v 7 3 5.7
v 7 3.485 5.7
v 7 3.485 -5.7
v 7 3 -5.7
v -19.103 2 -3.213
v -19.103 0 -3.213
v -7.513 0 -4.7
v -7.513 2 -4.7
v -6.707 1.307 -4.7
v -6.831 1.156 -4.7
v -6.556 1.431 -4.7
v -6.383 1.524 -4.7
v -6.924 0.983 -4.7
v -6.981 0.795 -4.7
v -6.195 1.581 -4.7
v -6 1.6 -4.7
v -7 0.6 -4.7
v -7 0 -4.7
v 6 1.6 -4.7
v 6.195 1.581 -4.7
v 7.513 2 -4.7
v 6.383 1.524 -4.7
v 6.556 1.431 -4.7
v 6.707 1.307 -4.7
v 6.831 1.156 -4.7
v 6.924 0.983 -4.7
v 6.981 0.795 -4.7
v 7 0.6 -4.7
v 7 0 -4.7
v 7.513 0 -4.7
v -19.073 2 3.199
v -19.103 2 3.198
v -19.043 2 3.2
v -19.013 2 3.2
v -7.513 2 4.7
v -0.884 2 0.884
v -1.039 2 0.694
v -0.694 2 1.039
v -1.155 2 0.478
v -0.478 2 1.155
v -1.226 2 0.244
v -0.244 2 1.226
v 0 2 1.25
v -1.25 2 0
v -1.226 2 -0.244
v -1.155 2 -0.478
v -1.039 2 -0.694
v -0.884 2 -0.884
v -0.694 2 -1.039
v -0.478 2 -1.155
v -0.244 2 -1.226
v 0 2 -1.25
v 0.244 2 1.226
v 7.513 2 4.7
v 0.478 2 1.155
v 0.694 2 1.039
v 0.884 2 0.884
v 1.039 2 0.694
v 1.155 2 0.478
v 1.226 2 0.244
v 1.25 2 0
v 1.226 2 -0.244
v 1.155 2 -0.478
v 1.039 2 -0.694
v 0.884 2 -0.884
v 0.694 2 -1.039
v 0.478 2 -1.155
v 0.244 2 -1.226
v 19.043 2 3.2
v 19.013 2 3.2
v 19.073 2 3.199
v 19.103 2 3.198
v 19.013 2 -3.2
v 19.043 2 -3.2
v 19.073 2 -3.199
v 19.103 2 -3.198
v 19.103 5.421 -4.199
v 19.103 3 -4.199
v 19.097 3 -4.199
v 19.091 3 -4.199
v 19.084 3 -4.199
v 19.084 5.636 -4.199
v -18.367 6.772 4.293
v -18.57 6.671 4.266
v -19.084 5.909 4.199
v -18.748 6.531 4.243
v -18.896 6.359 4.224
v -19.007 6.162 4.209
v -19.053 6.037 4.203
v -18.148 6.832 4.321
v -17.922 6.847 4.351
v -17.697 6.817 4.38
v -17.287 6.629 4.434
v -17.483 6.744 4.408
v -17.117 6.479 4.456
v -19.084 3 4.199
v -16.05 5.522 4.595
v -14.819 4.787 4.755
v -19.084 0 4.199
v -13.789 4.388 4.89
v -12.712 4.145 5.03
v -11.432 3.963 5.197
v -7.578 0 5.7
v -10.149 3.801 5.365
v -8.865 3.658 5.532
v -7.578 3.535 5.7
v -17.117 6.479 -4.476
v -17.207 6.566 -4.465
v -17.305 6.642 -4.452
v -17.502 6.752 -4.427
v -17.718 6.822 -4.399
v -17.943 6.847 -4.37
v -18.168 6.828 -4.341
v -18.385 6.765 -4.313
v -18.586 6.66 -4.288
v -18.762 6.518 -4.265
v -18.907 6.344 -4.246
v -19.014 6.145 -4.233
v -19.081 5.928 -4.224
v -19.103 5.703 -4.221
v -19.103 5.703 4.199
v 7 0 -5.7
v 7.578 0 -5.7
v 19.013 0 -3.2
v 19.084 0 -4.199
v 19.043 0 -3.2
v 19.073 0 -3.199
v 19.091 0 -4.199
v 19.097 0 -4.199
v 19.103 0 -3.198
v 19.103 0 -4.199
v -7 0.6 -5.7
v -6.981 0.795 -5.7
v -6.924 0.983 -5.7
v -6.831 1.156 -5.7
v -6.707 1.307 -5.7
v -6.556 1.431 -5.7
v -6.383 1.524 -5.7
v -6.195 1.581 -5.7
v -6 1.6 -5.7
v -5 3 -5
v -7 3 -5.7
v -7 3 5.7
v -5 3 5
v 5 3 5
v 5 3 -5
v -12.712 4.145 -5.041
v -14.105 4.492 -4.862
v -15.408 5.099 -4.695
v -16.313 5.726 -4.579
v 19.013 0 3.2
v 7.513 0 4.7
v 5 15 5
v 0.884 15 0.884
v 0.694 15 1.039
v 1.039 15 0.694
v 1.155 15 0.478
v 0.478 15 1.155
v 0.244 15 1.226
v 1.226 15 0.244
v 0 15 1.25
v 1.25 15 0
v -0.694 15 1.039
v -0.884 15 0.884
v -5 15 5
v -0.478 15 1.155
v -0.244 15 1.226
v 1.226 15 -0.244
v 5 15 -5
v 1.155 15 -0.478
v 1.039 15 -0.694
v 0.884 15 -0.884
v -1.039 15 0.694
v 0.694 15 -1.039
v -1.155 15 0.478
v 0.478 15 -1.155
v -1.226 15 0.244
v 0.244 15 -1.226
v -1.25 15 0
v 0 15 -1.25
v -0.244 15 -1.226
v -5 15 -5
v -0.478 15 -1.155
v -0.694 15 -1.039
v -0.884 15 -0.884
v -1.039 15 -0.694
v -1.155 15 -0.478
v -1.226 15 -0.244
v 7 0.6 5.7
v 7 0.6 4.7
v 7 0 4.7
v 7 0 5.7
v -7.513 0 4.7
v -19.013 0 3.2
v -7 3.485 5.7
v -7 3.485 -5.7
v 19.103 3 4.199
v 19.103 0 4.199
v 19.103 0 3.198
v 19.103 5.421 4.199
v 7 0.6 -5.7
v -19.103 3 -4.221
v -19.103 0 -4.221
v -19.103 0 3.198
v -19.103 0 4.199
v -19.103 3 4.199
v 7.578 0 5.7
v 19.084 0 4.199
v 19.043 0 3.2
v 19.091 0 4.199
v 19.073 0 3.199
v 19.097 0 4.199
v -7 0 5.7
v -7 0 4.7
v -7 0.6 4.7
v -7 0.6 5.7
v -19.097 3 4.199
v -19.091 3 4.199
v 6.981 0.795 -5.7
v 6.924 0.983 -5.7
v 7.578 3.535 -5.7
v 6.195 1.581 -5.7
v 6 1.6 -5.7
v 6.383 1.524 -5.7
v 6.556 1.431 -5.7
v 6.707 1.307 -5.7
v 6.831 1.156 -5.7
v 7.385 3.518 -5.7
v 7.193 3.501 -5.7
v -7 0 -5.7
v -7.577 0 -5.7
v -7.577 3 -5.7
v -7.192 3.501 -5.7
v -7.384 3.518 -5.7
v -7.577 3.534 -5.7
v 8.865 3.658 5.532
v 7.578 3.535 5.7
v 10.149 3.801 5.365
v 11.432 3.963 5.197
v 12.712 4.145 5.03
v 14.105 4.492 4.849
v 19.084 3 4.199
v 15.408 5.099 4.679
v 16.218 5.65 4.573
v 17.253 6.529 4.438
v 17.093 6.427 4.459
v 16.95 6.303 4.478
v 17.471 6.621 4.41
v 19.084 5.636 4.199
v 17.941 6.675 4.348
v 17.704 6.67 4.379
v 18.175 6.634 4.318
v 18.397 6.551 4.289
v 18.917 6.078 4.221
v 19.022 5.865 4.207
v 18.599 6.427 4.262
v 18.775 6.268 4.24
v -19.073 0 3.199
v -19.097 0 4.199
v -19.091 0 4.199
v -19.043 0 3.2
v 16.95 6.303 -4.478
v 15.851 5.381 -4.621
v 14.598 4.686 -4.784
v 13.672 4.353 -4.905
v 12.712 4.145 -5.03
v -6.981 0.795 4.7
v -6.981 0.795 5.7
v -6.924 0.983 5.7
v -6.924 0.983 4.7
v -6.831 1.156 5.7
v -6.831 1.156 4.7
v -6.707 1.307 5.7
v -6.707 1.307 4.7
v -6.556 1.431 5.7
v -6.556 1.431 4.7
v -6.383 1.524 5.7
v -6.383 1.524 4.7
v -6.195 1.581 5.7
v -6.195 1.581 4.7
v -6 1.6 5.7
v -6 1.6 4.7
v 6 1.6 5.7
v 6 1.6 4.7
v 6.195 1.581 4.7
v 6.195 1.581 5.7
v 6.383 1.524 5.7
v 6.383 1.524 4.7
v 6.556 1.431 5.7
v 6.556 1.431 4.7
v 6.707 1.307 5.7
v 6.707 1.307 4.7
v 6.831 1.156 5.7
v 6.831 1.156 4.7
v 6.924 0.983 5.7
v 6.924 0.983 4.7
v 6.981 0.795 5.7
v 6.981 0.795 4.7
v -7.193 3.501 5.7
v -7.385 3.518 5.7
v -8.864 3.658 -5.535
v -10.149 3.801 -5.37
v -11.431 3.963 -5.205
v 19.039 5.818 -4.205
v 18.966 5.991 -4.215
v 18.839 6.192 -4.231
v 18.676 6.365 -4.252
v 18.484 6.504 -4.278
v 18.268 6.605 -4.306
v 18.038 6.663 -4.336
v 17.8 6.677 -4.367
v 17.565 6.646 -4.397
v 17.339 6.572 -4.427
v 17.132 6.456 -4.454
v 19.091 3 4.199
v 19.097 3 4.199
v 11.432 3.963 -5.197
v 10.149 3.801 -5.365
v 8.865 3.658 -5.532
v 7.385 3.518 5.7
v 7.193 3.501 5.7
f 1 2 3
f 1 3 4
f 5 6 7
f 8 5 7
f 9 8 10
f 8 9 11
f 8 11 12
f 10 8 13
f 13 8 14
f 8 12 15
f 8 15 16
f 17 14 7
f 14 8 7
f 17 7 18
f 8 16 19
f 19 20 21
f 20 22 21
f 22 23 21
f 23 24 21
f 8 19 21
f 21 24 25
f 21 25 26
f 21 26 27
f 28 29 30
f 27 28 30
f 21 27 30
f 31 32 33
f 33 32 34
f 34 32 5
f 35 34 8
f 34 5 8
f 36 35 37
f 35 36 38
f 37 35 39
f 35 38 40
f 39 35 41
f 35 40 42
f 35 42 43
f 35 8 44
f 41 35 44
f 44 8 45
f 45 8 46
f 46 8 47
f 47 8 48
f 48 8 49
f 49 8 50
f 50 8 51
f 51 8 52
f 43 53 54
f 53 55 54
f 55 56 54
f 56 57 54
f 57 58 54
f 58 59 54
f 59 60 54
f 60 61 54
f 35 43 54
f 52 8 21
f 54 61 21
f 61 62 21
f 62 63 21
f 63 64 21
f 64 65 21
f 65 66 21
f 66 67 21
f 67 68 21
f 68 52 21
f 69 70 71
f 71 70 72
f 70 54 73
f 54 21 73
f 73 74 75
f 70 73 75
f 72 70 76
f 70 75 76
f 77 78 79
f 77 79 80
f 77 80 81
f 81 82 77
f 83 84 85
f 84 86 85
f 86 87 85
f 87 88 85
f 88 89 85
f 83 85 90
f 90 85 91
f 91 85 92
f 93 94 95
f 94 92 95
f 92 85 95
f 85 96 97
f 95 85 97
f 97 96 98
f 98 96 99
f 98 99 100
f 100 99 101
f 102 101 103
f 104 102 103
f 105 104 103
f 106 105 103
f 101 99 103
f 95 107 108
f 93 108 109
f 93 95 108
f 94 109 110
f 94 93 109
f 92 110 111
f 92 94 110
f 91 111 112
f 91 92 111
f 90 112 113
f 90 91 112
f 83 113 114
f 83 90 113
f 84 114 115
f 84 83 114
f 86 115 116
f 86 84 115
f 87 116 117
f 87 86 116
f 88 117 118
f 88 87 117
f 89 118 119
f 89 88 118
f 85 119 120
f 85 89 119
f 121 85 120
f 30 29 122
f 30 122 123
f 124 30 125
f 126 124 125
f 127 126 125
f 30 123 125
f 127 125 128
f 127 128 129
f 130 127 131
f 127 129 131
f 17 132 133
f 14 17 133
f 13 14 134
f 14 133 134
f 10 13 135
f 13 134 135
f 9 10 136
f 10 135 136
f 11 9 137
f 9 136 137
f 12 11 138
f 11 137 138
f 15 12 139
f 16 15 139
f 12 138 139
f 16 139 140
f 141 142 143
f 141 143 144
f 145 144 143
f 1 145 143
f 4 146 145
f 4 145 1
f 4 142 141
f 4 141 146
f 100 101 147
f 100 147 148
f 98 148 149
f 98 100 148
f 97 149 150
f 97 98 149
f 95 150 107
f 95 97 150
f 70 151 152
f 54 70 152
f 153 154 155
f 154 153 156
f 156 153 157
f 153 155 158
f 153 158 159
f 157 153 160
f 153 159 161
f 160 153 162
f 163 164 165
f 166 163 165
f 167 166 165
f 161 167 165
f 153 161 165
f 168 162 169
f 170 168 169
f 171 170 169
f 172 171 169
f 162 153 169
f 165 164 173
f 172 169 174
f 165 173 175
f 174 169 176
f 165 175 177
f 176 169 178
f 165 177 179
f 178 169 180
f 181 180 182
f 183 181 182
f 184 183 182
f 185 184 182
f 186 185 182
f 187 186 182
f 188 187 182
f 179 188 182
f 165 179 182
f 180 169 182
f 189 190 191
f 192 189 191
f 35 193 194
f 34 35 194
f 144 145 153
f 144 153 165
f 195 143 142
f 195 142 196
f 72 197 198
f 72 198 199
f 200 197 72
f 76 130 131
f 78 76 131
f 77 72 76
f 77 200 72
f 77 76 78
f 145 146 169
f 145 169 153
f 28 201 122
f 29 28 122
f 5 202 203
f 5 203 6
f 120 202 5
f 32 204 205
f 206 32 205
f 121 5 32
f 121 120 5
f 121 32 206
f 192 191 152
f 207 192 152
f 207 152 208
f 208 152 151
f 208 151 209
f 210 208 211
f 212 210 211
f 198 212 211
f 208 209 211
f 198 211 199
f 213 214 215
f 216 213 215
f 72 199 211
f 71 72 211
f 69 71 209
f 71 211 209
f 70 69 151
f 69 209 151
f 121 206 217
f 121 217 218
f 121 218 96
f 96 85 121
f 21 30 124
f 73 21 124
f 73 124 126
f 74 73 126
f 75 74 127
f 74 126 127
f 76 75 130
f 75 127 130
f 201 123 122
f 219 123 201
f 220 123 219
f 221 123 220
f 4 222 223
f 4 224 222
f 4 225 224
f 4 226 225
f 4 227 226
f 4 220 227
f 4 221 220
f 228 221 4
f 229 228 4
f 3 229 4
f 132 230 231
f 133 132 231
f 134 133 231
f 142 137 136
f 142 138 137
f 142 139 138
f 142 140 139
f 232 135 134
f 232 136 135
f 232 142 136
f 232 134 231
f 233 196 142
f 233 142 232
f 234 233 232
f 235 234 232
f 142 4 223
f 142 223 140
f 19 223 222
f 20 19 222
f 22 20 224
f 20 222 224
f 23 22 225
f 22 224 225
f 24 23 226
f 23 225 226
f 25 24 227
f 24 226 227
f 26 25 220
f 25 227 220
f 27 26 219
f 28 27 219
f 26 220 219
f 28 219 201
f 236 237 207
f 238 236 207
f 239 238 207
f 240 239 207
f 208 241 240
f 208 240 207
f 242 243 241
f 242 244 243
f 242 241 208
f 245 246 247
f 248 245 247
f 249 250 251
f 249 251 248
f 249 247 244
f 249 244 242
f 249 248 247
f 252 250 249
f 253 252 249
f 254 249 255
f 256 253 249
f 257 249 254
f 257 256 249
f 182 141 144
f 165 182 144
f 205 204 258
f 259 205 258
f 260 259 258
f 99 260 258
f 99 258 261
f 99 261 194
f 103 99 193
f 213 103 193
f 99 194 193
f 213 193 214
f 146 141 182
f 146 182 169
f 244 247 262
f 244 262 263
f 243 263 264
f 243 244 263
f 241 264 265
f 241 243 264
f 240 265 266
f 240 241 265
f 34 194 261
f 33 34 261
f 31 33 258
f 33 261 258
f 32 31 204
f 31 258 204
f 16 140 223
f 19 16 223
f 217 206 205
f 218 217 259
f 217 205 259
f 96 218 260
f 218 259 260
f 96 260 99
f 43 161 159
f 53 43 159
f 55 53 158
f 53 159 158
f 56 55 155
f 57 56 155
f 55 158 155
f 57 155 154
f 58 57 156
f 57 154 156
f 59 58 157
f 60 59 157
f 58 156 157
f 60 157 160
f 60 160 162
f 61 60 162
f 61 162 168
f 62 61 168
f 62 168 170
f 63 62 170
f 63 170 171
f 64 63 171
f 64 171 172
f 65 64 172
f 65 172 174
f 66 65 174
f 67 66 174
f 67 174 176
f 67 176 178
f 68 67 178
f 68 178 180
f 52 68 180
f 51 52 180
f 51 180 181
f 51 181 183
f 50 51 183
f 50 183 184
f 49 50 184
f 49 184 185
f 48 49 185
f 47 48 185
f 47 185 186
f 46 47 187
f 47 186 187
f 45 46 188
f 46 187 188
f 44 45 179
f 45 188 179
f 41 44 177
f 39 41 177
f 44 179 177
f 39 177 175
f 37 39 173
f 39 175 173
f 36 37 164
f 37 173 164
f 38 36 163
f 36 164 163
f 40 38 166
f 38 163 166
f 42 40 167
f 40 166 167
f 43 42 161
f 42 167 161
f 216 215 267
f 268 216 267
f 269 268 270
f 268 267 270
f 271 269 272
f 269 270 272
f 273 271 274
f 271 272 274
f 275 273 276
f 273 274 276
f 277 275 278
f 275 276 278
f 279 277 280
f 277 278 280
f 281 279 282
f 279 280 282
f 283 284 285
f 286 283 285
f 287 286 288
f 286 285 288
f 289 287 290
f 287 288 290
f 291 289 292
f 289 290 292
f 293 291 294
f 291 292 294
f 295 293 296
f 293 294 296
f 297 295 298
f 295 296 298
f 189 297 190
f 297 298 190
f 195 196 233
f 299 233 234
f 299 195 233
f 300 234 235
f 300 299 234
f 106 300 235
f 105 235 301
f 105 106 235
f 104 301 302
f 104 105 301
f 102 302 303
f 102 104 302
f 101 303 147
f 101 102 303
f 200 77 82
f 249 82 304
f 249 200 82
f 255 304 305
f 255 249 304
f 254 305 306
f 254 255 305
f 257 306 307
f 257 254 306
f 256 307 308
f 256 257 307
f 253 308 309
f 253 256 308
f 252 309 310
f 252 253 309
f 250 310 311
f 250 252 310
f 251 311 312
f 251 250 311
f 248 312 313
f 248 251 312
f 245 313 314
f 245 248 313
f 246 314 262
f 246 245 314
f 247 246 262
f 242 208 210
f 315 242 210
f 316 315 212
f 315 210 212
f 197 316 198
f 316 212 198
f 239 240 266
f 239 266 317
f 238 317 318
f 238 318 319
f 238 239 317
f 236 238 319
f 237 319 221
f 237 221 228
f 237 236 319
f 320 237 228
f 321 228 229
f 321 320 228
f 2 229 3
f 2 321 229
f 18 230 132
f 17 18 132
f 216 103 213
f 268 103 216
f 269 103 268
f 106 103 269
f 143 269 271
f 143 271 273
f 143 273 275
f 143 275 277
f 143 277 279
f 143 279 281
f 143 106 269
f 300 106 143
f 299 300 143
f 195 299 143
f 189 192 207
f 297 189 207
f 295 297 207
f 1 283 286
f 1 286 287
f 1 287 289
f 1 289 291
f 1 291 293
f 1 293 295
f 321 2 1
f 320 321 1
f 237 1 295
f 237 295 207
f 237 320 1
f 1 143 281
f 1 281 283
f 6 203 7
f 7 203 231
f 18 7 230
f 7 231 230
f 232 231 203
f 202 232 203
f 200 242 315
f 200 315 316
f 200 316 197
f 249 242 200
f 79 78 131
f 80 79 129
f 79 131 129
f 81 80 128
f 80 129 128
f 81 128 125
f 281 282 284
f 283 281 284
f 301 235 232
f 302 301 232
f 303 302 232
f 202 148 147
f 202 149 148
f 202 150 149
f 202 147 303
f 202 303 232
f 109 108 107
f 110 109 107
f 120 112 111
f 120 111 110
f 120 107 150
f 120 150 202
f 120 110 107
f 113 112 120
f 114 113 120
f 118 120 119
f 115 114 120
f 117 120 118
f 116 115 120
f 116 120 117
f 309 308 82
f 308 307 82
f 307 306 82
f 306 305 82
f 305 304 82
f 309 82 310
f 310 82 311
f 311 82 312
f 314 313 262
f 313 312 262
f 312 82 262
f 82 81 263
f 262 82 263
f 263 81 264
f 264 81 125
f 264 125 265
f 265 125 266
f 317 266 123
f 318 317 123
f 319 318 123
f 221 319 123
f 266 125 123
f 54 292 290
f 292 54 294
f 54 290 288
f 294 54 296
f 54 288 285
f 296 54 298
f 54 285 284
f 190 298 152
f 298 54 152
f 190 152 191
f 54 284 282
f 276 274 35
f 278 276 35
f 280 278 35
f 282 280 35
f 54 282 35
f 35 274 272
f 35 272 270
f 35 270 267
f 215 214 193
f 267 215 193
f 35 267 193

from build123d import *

# Parameters (mm, degrees)
BOSS_EXTRUDE1_DEPTH     = 2
BOSS_EXTRUDE2_DEPTH     = 1
BOSS_EXTRUDE3_DEPTH     = 12
BOSS_EXTRUDE4_REACH     = 31.886
CUT_EXTRUDE1_DEPTH      = 27.734434724
CUT_EXTRUDE1_DEPTH_BACK = 27.734434724
SKETCH6_R               = 1.25
CUT_EXTRUDE2_DEPTH      = 25.948268421
CUT_EXTRUDE3_DEPTH      = 27.830693137


with BuildPart() as part:
    # Sketch1 → Boss-Extrude1 (new body)
    with BuildSketch(Plane(origin=(0, 0, 0), x_dir=(1, 0, 0), z_dir=(0, 1, 0))):
        with BuildLine():
            Line((-7.576663768, 5.7), (-19.534464968, 4.165854918))
            ThreePointArc((-19.534464968, 4.165854918), (-23.193935143, -0.225628046), (-19.084438942, -4.199151112))
            Line((-19.084438942, -4.199151112), (-7.577930804, -5.7))
            Line((-7.577930804, -5.7), (7.577930804, -5.7))
            Line((7.577930804, -5.7), (19.084438942, -4.199151112))
            ThreePointArc((19.084438942, -4.199151112), (23.2, 0), (19.084438942, 4.199151112))
            Line((19.084438942, 4.199151112), (7.577930804, 5.7))
            Line((7.577930804, 5.7), (-7.576663768, 5.7))
        make_face()
        with BuildLine():
            Line((-7.512988467, -4.7), (-19.013197102, -3.199972787))
            ThreePointArc((-19.013197102, -3.199972787), (-22.193903464, -0.197435212), (-19.407211404, 3.173984699))
            Line((-19.407211404, 3.173984699), (-7.512777295, 4.7))
            Line((-7.512777295, 4.7), (7.512988467, 4.7))
            Line((7.512988467, 4.7), (19.013197102, 3.199972787))
            ThreePointArc((19.013197102, 3.199972787), (22.2, 0), (19.013197102, -3.199972787))
            Line((19.013197102, -3.199972787), (7.512988467, -4.7))
            Line((7.512988467, -4.7), (-7.512988467, -4.7))
        make_face(mode=Mode.SUBTRACT)
    extrude(amount=BOSS_EXTRUDE1_DEPTH)

    # Sketch2 → Boss-Extrude2 (add)
    with BuildSketch(Plane(origin=(0, 2, 0), x_dir=(1, 0, 0), z_dir=(0, 1, 0))):
        with BuildLine():
            Line((7.577930804, -5.7), (19.084438942, -4.199151112))
            ThreePointArc((19.084438942, -4.199151112), (23.2, 0), (19.084438942, 4.199151112))
            Line((19.084438942, 4.199151112), (7.577930804, 5.7))
            Line((7.577930804, 5.7), (-7.576663768, 5.7))
            Line((-7.576663768, 5.7), (-19.534464968, 4.165854918))
            ThreePointArc((-19.534464968, 4.165854918), (-23.193935143, -0.225628046), (-19.084438942, -4.199151112))
            Line((-19.084438942, -4.199151112), (-7.577930804, -5.7))
            Line((-7.577930804, -5.7), (7.577930804, -5.7))
        make_face()
    extrude(amount=BOSS_EXTRUDE2_DEPTH)

    # Sketch3 → Boss-Extrude3 (add)
    with BuildSketch(Plane(origin=(0, 3, 0), x_dir=(1, 0, 0), z_dir=(0, 1, 0))):
        Polygon((-5, 0), (-5, 5), (5, 5), (5, -5), (-5, -5), align=None)
    extrude(amount=BOSS_EXTRUDE3_DEPTH)

    # Boss-Extrude4: up to this face of the body (flat: up to its plane)
    boss_extrude4_end = Plane(part.part.faces().sort_by_distance((0.000633518, 1.5, -5.7))[0])
    # Sketch4 → Boss-Extrude4 (add, up to the picked face)
    with BuildSketch(Plane.XY.offset(5.7), mode=Mode.PRIVATE) as boss_extrude4_sk1:
        with BuildLine():
            Line((-19.103038774, 3), (-7, 3))
            Line((-7, 3), (-7, 3.485357144))
            ThreePointArc((-7, 3.485357144), (-9.86131573, 3.767251876), (-12.711609357, 4.144635751))
            ThreePointArc((-12.711609357, 4.144635751), (-15.114103805, 4.934855361), (-17.117340124, 6.478704724))
            ThreePointArc((-17.117340124, 6.478704724), (-18.375058248, 6.768970937), (-19.103038774, 5.703065825))
            Line((-19.103038774, 5.703065825), (-19.103038774, 3))
        make_face()
    boss_extrude4_tool1 = split(extrude(boss_extrude4_sk1.sketch, amount=-BOSS_EXTRUDE4_REACH, mode=Mode.PRIVATE), bisect_by=boss_extrude4_end, keep=Keep.BOTH, mode=Mode.PRIVATE)
    # Sketch4 → Boss-Extrude4 (add, up to the picked face)
    with BuildSketch(Plane.XY.offset(5.7), mode=Mode.PRIVATE) as boss_extrude4_sk2:
        with BuildLine():
            Line((7, 3.485357144), (7, 3))
            Line((7, 3), (19.103038774, 3))
            Line((19.103038774, 3), (19.103038774, 5.420959691))
            ThreePointArc((19.103038774, 5.420959691), (18.322193887, 6.584407955), (16.949634957, 6.302605569))
            ThreePointArc((16.949634957, 6.302605569), (15.0061995, 4.878805237), (12.711609357, 4.144635751))
            ThreePointArc((12.711609357, 4.144635751), (9.86131573, 3.767251876), (7, 3.485357144))
        make_face()
    boss_extrude4_tool2 = split(extrude(boss_extrude4_sk2.sketch, amount=-BOSS_EXTRUDE4_REACH, mode=Mode.PRIVATE), bisect_by=boss_extrude4_end, keep=Keep.BOTH, mode=Mode.PRIVATE)
    add(boss_extrude4_tool1.solids().sort_by(Axis((-15.203187, 4.213829, 5.7), (0, 0, -1)))[0])
    add(boss_extrude4_tool2.solids().sort_by(Axis((15.148816, 4.17304, 5.7), (0, 0, -1)))[0])

    # Sketch5 → Cut-Extrude1 (cut, two sides: drawn at the far end of the back side and taken through both)
    with BuildSketch(Plane.XZ.offset(-3).offset(-CUT_EXTRUDE1_DEPTH_BACK)):
        with BuildLine():
            ThreePointArc((19.103038774, -4.198735883), (23.2, 0), (19.103038774, 4.198735883))
            Line((19.103038774, 4.198735883), (19.103038774, -4.198735883))
        make_face()
        with BuildLine():
            ThreePointArc((19.084438942, 4.199151112), (19.093739088, 4.198953796), (19.103038774, 4.198735883))
            Line((19.103038774, 4.198735883), (19.103038774, 5.7))
            Line((19.103038774, 5.7), (7.577930804, 5.7))
            Line((7.577930804, 5.7), (19.084438942, 4.199151112))
        make_face()
        with BuildLine():
            Line((19.103038774, -5.7), (19.103038774, -4.198735883))
            ThreePointArc((19.103038774, -4.198735883), (19.093739088, -4.198953796), (19.084438942, -4.199151112))
            Line((19.084438942, -4.199151112), (7.577930804, -5.7))
            Line((7.577930804, -5.7), (19.103038774, -5.7))
        make_face()
        with BuildLine():
            Line((-19.534464968, -4.165854918), (-19.103038774, -4.221205426))
            Line((-19.103038774, -4.221205426), (-19.103038774, 4.198735883))
            ThreePointArc((-19.103038774, 4.198735883), (-23.194424582, 0.216338692), (-19.534464968, -4.165854918))
        make_face()
        Polygon((-7.576663768, -5.7), (-19.103038774, -4.221205426), (-19.103038774, -5.7), align=None)
        with BuildLine():
            Line((-19.103038774, 5.7), (-19.103038774, 4.198735883))
            ThreePointArc((-19.103038774, 4.198735883), (-19.093739088, 4.198953796), (-19.084438942, 4.199151112))
            Line((-19.084438942, 4.199151112), (-7.577930804, 5.7))
            Line((-7.577930804, 5.7), (-19.103038774, 5.7))
        make_face()
    extrude(amount=CUT_EXTRUDE1_DEPTH + CUT_EXTRUDE1_DEPTH_BACK, mode=Mode.SUBTRACT)

    # Sketch6 → Cut-Extrude2 (cut, through all)
    with BuildSketch(Plane(origin=(0, 15, 0), x_dir=(1, 0, 0), z_dir=(0, 1, 0))):
        with Locations(Location((0, 0, 0), (0, 0, 270))):
            Circle(SKETCH6_R)
    extrude(amount=-CUT_EXTRUDE2_DEPTH, mode=Mode.SUBTRACT)

    # Sketch7 → Cut-Extrude3 (cut, through all)
    with BuildSketch(Plane(origin=(0, 0, -5.7), x_dir=(-1, 0, 0), z_dir=(0, 0, -1))):
        with BuildLine():
            Line((-7, 0.6), (-7, 0))
            Line((-7, 0), (7, 0))
            Line((7, 0), (7, 0.6))
            ThreePointArc((7, 0.6), (6.707106781, 1.307106781), (6, 1.6))
            Line((6, 1.6), (-6, 1.6))
            ThreePointArc((-6, 1.6), (-6.707106781, 1.307106781), (-7, 0.6))
        make_face()
    extrude(amount=-CUT_EXTRUDE3_DEPTH, mode=Mode.SUBTRACT)


solid = part.part
